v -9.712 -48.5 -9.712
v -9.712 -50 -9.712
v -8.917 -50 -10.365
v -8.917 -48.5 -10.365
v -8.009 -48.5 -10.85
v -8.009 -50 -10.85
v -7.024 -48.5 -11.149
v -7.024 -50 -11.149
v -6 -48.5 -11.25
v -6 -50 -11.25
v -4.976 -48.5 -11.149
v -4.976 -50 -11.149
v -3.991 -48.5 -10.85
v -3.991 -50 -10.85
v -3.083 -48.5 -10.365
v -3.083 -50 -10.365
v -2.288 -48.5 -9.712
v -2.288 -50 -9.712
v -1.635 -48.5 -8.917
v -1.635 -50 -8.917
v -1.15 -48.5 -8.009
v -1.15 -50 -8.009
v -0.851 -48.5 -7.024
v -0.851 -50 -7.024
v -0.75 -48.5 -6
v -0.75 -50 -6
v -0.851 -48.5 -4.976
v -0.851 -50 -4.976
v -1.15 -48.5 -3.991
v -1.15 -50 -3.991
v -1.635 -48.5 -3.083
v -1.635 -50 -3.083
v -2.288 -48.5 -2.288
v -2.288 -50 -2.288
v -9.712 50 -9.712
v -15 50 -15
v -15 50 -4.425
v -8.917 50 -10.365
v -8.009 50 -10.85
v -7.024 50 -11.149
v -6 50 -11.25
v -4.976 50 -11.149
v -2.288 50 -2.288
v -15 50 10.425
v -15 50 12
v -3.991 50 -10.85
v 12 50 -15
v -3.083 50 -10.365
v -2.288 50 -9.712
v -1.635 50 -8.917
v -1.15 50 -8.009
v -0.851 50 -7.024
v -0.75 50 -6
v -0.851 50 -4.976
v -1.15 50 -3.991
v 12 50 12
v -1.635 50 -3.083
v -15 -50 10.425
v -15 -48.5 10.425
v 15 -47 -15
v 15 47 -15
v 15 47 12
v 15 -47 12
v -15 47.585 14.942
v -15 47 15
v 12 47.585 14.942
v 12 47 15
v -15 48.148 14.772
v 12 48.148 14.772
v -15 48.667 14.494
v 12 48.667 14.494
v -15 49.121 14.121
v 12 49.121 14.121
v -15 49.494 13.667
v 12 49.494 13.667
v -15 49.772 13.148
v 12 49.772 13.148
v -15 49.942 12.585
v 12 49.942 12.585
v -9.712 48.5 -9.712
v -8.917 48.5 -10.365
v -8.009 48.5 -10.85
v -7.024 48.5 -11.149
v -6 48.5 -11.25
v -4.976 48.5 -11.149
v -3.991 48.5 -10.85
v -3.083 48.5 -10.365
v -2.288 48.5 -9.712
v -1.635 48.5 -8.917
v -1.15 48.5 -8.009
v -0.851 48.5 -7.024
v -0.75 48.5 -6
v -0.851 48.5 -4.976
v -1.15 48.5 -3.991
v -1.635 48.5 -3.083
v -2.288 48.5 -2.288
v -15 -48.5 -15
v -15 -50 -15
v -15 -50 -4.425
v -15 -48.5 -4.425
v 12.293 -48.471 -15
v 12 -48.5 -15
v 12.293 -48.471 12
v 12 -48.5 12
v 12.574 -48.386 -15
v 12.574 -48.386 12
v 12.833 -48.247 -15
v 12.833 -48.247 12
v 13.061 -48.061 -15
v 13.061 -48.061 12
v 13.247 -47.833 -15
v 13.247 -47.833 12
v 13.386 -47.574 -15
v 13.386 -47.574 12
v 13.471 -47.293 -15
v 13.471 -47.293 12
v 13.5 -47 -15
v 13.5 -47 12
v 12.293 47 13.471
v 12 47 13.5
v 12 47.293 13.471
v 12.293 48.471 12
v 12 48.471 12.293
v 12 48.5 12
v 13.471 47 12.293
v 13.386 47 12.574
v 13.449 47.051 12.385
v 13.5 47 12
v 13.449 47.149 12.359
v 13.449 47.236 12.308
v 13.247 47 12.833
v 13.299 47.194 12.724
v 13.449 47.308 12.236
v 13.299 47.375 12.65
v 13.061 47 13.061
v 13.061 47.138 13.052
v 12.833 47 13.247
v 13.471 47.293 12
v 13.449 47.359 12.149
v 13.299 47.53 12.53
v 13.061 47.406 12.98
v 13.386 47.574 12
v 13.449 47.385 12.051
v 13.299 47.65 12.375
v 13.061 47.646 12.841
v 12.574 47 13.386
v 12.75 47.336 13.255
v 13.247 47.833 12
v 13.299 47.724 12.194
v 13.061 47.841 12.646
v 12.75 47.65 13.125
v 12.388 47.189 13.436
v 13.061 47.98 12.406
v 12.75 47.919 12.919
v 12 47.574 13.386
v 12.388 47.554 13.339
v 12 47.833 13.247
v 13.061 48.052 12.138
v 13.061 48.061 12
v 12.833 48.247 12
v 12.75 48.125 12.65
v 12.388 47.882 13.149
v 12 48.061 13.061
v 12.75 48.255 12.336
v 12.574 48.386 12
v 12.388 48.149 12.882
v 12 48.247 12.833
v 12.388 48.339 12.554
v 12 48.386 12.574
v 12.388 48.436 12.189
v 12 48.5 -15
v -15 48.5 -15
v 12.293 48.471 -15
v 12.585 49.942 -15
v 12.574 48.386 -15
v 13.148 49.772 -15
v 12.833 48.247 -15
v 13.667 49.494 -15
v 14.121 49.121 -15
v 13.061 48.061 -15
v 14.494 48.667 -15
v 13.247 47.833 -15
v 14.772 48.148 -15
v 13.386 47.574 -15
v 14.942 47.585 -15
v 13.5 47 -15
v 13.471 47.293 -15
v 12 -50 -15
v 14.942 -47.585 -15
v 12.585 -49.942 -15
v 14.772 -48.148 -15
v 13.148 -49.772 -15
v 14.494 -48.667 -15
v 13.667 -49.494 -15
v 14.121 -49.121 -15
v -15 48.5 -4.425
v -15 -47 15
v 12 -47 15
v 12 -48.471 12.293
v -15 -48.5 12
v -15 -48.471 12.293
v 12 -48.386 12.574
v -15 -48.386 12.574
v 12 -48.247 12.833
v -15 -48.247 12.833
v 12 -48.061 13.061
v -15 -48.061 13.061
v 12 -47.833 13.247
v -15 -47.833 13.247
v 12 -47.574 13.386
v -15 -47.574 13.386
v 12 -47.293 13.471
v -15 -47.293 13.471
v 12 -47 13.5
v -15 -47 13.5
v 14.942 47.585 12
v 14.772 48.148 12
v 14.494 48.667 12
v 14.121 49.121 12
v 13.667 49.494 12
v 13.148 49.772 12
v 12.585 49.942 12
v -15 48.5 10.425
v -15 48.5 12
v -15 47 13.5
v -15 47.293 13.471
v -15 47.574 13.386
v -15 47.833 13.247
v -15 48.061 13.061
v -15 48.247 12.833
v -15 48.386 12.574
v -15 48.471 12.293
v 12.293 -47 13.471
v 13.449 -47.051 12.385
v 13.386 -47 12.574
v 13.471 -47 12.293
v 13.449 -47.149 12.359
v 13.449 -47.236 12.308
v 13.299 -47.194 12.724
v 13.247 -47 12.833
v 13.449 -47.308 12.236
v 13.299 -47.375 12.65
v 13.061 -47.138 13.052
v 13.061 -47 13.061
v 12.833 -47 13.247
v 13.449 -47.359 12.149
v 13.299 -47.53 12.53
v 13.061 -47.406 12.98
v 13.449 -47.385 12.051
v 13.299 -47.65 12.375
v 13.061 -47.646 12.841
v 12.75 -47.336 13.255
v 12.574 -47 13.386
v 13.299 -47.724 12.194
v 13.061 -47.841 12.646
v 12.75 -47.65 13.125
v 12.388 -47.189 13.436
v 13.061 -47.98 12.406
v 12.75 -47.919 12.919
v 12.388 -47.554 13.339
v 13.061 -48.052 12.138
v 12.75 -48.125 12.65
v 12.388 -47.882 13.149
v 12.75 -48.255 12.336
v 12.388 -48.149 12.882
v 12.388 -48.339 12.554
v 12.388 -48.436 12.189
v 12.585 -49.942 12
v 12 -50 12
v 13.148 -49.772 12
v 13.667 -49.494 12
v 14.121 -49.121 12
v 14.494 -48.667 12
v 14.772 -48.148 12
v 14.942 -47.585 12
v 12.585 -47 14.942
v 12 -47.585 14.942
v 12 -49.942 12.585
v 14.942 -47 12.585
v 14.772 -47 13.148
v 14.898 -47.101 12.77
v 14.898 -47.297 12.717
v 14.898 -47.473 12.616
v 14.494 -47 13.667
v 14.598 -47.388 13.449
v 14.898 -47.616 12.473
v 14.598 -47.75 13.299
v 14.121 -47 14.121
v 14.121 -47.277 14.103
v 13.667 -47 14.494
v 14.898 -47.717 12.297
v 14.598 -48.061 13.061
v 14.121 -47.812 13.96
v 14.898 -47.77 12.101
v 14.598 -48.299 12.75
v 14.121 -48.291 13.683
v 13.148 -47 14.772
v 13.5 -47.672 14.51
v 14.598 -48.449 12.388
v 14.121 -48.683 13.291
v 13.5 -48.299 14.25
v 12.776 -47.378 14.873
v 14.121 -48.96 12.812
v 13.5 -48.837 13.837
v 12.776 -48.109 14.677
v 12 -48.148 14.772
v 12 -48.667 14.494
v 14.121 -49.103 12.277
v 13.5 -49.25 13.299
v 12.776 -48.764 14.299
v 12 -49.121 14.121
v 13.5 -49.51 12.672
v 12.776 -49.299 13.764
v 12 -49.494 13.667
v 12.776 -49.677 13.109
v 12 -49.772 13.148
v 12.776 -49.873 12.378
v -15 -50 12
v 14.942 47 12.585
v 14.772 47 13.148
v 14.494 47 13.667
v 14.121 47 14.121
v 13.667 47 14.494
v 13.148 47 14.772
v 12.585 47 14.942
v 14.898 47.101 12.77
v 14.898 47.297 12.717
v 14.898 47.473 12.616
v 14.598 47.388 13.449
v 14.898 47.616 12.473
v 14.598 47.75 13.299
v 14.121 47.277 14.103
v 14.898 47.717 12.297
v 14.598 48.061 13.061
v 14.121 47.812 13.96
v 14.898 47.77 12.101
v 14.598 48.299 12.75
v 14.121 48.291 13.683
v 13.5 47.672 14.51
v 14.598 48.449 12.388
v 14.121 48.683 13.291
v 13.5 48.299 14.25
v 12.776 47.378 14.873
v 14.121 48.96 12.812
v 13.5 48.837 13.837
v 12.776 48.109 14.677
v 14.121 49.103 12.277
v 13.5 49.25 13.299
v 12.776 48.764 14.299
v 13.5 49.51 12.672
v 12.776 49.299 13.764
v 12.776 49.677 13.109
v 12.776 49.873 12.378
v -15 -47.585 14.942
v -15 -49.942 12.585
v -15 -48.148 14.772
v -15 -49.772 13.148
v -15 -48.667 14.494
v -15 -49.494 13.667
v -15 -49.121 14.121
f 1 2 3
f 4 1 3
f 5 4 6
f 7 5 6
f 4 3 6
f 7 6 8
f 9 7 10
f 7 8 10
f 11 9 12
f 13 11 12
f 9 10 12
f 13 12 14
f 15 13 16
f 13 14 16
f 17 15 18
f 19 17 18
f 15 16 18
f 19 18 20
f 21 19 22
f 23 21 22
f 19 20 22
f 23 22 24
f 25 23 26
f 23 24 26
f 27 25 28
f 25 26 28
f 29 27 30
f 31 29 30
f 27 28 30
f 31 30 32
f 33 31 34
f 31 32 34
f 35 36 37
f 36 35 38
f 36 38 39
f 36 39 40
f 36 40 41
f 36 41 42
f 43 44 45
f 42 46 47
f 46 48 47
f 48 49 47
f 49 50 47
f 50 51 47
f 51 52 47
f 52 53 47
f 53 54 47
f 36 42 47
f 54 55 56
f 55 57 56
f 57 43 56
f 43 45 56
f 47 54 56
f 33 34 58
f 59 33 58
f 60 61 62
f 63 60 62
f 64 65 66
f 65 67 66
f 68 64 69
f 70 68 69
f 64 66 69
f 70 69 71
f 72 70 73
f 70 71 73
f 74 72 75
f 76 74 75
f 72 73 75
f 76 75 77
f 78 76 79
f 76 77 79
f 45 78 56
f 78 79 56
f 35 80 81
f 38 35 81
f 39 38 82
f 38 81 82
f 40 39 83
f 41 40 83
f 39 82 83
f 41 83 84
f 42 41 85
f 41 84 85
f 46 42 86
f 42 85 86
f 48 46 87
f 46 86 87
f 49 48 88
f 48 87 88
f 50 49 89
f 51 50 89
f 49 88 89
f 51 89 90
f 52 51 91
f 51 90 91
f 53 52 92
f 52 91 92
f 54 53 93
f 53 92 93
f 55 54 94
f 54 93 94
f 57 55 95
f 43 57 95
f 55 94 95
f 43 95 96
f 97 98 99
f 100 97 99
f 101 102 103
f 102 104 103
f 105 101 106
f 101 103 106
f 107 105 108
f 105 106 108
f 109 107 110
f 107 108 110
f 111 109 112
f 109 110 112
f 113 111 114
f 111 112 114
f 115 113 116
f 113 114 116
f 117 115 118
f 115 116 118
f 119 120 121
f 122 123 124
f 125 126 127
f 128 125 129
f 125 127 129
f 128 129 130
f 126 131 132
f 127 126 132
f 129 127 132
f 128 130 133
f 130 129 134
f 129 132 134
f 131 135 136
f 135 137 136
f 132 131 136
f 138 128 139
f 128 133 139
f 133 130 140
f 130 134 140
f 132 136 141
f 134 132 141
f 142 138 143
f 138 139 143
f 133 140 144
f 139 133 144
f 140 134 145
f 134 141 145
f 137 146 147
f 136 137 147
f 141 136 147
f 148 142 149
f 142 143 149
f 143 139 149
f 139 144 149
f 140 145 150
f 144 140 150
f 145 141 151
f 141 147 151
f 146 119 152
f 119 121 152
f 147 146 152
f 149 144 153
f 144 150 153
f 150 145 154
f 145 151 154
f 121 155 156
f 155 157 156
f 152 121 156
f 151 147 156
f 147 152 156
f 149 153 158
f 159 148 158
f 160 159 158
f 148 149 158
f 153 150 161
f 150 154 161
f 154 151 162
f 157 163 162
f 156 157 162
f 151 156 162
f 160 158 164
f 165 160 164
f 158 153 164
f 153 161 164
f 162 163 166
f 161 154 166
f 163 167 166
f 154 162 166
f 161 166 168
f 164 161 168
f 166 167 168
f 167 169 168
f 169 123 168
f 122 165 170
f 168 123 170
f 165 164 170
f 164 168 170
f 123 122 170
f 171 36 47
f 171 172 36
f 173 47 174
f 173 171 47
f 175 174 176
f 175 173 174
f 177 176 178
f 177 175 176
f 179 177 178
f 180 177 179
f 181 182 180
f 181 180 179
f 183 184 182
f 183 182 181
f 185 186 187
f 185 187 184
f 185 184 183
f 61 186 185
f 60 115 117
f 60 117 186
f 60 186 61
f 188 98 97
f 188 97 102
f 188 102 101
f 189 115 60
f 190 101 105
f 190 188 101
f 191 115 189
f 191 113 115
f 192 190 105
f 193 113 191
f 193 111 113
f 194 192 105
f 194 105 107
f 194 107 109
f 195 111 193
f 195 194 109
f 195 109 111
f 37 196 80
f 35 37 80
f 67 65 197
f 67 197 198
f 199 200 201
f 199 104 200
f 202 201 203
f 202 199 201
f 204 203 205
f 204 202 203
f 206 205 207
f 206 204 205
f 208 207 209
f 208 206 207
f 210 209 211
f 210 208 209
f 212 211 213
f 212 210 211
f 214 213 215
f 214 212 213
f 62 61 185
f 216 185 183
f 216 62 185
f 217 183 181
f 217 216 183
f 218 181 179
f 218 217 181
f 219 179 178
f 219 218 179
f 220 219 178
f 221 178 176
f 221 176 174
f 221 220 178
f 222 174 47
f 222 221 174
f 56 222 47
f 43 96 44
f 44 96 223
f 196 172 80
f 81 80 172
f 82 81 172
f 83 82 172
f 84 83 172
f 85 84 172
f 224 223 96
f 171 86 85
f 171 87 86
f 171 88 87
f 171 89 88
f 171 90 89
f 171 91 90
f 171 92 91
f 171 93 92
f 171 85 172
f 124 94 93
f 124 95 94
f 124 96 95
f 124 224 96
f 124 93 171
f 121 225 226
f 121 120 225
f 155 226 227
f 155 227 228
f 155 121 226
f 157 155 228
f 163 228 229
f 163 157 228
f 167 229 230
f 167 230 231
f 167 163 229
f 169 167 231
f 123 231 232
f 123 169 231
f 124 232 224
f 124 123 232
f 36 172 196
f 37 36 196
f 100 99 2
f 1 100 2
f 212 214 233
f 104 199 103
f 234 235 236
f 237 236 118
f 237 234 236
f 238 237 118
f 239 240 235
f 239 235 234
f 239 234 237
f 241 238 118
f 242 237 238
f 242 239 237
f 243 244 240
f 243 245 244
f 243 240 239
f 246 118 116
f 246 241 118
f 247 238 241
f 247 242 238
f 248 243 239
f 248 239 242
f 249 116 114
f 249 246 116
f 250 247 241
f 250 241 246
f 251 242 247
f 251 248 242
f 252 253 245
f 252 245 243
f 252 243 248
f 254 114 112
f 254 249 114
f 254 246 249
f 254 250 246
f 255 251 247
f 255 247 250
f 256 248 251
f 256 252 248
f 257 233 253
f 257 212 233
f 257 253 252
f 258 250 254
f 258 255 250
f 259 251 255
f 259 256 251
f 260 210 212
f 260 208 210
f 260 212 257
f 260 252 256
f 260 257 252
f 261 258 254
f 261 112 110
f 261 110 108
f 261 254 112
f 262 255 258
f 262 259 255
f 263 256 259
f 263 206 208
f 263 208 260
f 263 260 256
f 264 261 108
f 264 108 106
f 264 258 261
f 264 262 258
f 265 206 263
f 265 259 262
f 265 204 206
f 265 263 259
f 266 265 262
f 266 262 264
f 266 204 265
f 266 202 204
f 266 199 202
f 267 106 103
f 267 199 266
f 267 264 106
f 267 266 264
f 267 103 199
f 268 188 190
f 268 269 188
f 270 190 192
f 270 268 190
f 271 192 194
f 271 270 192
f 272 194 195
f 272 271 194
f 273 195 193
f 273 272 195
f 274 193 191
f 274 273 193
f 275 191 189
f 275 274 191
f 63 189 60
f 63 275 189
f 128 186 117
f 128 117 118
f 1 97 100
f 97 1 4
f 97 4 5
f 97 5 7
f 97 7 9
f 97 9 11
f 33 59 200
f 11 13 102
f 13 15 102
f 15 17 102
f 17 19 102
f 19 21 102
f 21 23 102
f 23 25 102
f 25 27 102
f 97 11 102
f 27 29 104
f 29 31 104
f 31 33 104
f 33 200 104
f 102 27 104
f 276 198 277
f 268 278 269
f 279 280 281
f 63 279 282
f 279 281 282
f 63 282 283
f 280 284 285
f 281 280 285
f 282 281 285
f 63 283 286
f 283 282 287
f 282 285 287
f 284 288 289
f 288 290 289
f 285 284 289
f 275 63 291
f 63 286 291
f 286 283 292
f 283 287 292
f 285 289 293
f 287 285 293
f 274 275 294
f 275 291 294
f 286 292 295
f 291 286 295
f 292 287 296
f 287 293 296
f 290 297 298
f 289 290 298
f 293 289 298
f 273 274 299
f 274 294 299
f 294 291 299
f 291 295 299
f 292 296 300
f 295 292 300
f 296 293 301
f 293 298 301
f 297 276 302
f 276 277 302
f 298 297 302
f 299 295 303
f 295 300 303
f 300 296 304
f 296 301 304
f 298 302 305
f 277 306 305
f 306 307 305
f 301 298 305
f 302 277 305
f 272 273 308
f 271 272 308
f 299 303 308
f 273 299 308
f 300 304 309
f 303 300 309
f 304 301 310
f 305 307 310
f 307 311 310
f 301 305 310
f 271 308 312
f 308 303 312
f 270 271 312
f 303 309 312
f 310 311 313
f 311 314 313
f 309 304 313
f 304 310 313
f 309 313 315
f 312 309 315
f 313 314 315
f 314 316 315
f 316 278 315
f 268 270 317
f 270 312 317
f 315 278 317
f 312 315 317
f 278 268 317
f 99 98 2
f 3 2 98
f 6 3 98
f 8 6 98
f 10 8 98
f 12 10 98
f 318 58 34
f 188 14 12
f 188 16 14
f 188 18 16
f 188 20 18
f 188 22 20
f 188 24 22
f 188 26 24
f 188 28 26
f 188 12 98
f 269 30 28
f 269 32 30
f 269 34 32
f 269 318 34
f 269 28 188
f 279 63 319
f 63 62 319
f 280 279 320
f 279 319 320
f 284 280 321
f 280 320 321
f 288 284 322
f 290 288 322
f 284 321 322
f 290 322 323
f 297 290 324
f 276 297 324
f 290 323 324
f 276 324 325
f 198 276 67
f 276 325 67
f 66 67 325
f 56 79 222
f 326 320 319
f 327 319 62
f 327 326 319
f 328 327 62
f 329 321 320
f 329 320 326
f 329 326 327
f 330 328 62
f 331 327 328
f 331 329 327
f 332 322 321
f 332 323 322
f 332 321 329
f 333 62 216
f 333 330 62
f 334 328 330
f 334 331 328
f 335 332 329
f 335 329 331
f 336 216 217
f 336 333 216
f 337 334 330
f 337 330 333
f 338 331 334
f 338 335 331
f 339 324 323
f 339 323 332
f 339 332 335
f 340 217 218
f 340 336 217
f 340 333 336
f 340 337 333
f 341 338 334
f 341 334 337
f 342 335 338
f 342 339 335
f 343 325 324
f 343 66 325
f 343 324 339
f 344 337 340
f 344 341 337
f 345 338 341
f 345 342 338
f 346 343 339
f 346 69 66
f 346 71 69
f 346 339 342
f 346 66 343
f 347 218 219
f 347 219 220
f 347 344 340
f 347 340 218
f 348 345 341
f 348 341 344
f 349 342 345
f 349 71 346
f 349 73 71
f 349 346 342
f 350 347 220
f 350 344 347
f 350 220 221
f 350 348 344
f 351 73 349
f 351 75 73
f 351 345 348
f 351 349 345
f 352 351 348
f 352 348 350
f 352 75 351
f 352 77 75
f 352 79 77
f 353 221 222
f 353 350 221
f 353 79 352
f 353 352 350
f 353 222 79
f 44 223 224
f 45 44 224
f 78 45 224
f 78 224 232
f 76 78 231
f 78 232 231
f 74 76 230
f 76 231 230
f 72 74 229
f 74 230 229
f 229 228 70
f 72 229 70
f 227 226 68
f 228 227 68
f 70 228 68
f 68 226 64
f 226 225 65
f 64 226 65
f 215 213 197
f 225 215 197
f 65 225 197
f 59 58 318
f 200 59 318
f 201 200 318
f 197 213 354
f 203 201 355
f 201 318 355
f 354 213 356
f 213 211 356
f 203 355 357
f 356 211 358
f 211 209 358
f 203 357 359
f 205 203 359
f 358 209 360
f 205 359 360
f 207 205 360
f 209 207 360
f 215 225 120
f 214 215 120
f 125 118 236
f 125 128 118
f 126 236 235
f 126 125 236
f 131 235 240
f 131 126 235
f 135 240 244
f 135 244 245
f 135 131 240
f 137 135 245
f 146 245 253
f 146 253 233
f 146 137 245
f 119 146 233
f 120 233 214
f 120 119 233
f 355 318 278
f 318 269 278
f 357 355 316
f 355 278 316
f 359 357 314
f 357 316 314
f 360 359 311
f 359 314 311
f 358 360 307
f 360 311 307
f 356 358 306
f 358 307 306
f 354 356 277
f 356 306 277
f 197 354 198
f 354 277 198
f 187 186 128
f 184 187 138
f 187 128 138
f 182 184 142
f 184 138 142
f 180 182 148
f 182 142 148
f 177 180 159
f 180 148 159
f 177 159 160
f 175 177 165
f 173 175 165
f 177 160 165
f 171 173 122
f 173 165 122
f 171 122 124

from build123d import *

# Parameters (mm, degrees)
F0_W          = 30
F0_H          = 30
F1_DEPTH      = 50
F1_DEPTH_BACK = 50
F2_R          = 3
F3_T          = -1.5
F5_DEPTH      = 100.001


with BuildPart() as f1:
    # F0 (on Front) → F1 (new body, two sides)
    with BuildSketch(Plane.XZ) as f1_sk:
        Rectangle(F0_W, F0_H)
    extrude(amount=F1_DEPTH)
    extrude(f1_sk.sketch, amount=-F1_DEPTH_BACK)

    # F2
    f2_edges = [f1.edges().sort_by_distance(p)[0] for p in [
        (0, -50, 15),
        (0, 50, 15),
        (15, 0, 15),
        (15, -50, 0),
        (15, 50, 0),
    ]]
    fillet(f2_edges, radius=F2_R)

    # F3
    f3_openings = [f1.faces().sort_by_distance(p)[0] for p in [
        (-15, 0, -0.018475),
        (-0.018475, 0, -15),
    ]]
    offset(amount=F3_T, openings=f3_openings)

    # F4 (on face) → F5 (cut, through all)
    with BuildSketch(Plane.XZ.offset(50)):
        with BuildLine():
            Line((-15, -4.424621), (-9.712311, -9.712311))
            ThreePointArc((-9.712311, -9.712311), (-2.287689, -9.712311), (-2.287689, -2.287689))
            Line((-2.287689, -2.287689), (-15, 10.424621))
            Line((-15, 10.424621), (-15, -4.424621))
        make_face()
    extrude(amount=-F5_DEPTH, mode=Mode.SUBTRACT)


solid = f1.part
